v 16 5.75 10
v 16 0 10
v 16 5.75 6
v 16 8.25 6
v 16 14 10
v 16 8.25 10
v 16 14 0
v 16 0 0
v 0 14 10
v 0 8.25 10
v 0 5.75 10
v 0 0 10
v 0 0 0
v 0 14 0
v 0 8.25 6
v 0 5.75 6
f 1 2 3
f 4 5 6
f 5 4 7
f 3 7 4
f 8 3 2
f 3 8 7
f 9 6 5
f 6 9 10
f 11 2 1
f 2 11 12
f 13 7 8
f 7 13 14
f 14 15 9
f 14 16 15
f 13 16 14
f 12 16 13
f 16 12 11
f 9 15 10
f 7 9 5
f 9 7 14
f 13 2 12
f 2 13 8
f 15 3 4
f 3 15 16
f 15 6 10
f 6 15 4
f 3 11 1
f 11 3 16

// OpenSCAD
$fn = 32;

// ----------------------------------------------------------------------
// Micro clip: slotted block, 5-20 mm class
// ----------------------------------------------------------------------

// --- parameters (mm) ---
block_l = 16;             // block length, X
block_w = 14;             // block width, Y
block_h = 10;             // block height, Z
slot_w = 2.5;             // slot width
slot_d = 4;               // slot depth from the top

difference() {
  cube([block_l, block_w, block_h]);
  translate([-1, block_w / 2 - slot_w / 2, block_h - slot_d])
    cube([block_l + 2, slot_w, slot_d + 1]);
}
